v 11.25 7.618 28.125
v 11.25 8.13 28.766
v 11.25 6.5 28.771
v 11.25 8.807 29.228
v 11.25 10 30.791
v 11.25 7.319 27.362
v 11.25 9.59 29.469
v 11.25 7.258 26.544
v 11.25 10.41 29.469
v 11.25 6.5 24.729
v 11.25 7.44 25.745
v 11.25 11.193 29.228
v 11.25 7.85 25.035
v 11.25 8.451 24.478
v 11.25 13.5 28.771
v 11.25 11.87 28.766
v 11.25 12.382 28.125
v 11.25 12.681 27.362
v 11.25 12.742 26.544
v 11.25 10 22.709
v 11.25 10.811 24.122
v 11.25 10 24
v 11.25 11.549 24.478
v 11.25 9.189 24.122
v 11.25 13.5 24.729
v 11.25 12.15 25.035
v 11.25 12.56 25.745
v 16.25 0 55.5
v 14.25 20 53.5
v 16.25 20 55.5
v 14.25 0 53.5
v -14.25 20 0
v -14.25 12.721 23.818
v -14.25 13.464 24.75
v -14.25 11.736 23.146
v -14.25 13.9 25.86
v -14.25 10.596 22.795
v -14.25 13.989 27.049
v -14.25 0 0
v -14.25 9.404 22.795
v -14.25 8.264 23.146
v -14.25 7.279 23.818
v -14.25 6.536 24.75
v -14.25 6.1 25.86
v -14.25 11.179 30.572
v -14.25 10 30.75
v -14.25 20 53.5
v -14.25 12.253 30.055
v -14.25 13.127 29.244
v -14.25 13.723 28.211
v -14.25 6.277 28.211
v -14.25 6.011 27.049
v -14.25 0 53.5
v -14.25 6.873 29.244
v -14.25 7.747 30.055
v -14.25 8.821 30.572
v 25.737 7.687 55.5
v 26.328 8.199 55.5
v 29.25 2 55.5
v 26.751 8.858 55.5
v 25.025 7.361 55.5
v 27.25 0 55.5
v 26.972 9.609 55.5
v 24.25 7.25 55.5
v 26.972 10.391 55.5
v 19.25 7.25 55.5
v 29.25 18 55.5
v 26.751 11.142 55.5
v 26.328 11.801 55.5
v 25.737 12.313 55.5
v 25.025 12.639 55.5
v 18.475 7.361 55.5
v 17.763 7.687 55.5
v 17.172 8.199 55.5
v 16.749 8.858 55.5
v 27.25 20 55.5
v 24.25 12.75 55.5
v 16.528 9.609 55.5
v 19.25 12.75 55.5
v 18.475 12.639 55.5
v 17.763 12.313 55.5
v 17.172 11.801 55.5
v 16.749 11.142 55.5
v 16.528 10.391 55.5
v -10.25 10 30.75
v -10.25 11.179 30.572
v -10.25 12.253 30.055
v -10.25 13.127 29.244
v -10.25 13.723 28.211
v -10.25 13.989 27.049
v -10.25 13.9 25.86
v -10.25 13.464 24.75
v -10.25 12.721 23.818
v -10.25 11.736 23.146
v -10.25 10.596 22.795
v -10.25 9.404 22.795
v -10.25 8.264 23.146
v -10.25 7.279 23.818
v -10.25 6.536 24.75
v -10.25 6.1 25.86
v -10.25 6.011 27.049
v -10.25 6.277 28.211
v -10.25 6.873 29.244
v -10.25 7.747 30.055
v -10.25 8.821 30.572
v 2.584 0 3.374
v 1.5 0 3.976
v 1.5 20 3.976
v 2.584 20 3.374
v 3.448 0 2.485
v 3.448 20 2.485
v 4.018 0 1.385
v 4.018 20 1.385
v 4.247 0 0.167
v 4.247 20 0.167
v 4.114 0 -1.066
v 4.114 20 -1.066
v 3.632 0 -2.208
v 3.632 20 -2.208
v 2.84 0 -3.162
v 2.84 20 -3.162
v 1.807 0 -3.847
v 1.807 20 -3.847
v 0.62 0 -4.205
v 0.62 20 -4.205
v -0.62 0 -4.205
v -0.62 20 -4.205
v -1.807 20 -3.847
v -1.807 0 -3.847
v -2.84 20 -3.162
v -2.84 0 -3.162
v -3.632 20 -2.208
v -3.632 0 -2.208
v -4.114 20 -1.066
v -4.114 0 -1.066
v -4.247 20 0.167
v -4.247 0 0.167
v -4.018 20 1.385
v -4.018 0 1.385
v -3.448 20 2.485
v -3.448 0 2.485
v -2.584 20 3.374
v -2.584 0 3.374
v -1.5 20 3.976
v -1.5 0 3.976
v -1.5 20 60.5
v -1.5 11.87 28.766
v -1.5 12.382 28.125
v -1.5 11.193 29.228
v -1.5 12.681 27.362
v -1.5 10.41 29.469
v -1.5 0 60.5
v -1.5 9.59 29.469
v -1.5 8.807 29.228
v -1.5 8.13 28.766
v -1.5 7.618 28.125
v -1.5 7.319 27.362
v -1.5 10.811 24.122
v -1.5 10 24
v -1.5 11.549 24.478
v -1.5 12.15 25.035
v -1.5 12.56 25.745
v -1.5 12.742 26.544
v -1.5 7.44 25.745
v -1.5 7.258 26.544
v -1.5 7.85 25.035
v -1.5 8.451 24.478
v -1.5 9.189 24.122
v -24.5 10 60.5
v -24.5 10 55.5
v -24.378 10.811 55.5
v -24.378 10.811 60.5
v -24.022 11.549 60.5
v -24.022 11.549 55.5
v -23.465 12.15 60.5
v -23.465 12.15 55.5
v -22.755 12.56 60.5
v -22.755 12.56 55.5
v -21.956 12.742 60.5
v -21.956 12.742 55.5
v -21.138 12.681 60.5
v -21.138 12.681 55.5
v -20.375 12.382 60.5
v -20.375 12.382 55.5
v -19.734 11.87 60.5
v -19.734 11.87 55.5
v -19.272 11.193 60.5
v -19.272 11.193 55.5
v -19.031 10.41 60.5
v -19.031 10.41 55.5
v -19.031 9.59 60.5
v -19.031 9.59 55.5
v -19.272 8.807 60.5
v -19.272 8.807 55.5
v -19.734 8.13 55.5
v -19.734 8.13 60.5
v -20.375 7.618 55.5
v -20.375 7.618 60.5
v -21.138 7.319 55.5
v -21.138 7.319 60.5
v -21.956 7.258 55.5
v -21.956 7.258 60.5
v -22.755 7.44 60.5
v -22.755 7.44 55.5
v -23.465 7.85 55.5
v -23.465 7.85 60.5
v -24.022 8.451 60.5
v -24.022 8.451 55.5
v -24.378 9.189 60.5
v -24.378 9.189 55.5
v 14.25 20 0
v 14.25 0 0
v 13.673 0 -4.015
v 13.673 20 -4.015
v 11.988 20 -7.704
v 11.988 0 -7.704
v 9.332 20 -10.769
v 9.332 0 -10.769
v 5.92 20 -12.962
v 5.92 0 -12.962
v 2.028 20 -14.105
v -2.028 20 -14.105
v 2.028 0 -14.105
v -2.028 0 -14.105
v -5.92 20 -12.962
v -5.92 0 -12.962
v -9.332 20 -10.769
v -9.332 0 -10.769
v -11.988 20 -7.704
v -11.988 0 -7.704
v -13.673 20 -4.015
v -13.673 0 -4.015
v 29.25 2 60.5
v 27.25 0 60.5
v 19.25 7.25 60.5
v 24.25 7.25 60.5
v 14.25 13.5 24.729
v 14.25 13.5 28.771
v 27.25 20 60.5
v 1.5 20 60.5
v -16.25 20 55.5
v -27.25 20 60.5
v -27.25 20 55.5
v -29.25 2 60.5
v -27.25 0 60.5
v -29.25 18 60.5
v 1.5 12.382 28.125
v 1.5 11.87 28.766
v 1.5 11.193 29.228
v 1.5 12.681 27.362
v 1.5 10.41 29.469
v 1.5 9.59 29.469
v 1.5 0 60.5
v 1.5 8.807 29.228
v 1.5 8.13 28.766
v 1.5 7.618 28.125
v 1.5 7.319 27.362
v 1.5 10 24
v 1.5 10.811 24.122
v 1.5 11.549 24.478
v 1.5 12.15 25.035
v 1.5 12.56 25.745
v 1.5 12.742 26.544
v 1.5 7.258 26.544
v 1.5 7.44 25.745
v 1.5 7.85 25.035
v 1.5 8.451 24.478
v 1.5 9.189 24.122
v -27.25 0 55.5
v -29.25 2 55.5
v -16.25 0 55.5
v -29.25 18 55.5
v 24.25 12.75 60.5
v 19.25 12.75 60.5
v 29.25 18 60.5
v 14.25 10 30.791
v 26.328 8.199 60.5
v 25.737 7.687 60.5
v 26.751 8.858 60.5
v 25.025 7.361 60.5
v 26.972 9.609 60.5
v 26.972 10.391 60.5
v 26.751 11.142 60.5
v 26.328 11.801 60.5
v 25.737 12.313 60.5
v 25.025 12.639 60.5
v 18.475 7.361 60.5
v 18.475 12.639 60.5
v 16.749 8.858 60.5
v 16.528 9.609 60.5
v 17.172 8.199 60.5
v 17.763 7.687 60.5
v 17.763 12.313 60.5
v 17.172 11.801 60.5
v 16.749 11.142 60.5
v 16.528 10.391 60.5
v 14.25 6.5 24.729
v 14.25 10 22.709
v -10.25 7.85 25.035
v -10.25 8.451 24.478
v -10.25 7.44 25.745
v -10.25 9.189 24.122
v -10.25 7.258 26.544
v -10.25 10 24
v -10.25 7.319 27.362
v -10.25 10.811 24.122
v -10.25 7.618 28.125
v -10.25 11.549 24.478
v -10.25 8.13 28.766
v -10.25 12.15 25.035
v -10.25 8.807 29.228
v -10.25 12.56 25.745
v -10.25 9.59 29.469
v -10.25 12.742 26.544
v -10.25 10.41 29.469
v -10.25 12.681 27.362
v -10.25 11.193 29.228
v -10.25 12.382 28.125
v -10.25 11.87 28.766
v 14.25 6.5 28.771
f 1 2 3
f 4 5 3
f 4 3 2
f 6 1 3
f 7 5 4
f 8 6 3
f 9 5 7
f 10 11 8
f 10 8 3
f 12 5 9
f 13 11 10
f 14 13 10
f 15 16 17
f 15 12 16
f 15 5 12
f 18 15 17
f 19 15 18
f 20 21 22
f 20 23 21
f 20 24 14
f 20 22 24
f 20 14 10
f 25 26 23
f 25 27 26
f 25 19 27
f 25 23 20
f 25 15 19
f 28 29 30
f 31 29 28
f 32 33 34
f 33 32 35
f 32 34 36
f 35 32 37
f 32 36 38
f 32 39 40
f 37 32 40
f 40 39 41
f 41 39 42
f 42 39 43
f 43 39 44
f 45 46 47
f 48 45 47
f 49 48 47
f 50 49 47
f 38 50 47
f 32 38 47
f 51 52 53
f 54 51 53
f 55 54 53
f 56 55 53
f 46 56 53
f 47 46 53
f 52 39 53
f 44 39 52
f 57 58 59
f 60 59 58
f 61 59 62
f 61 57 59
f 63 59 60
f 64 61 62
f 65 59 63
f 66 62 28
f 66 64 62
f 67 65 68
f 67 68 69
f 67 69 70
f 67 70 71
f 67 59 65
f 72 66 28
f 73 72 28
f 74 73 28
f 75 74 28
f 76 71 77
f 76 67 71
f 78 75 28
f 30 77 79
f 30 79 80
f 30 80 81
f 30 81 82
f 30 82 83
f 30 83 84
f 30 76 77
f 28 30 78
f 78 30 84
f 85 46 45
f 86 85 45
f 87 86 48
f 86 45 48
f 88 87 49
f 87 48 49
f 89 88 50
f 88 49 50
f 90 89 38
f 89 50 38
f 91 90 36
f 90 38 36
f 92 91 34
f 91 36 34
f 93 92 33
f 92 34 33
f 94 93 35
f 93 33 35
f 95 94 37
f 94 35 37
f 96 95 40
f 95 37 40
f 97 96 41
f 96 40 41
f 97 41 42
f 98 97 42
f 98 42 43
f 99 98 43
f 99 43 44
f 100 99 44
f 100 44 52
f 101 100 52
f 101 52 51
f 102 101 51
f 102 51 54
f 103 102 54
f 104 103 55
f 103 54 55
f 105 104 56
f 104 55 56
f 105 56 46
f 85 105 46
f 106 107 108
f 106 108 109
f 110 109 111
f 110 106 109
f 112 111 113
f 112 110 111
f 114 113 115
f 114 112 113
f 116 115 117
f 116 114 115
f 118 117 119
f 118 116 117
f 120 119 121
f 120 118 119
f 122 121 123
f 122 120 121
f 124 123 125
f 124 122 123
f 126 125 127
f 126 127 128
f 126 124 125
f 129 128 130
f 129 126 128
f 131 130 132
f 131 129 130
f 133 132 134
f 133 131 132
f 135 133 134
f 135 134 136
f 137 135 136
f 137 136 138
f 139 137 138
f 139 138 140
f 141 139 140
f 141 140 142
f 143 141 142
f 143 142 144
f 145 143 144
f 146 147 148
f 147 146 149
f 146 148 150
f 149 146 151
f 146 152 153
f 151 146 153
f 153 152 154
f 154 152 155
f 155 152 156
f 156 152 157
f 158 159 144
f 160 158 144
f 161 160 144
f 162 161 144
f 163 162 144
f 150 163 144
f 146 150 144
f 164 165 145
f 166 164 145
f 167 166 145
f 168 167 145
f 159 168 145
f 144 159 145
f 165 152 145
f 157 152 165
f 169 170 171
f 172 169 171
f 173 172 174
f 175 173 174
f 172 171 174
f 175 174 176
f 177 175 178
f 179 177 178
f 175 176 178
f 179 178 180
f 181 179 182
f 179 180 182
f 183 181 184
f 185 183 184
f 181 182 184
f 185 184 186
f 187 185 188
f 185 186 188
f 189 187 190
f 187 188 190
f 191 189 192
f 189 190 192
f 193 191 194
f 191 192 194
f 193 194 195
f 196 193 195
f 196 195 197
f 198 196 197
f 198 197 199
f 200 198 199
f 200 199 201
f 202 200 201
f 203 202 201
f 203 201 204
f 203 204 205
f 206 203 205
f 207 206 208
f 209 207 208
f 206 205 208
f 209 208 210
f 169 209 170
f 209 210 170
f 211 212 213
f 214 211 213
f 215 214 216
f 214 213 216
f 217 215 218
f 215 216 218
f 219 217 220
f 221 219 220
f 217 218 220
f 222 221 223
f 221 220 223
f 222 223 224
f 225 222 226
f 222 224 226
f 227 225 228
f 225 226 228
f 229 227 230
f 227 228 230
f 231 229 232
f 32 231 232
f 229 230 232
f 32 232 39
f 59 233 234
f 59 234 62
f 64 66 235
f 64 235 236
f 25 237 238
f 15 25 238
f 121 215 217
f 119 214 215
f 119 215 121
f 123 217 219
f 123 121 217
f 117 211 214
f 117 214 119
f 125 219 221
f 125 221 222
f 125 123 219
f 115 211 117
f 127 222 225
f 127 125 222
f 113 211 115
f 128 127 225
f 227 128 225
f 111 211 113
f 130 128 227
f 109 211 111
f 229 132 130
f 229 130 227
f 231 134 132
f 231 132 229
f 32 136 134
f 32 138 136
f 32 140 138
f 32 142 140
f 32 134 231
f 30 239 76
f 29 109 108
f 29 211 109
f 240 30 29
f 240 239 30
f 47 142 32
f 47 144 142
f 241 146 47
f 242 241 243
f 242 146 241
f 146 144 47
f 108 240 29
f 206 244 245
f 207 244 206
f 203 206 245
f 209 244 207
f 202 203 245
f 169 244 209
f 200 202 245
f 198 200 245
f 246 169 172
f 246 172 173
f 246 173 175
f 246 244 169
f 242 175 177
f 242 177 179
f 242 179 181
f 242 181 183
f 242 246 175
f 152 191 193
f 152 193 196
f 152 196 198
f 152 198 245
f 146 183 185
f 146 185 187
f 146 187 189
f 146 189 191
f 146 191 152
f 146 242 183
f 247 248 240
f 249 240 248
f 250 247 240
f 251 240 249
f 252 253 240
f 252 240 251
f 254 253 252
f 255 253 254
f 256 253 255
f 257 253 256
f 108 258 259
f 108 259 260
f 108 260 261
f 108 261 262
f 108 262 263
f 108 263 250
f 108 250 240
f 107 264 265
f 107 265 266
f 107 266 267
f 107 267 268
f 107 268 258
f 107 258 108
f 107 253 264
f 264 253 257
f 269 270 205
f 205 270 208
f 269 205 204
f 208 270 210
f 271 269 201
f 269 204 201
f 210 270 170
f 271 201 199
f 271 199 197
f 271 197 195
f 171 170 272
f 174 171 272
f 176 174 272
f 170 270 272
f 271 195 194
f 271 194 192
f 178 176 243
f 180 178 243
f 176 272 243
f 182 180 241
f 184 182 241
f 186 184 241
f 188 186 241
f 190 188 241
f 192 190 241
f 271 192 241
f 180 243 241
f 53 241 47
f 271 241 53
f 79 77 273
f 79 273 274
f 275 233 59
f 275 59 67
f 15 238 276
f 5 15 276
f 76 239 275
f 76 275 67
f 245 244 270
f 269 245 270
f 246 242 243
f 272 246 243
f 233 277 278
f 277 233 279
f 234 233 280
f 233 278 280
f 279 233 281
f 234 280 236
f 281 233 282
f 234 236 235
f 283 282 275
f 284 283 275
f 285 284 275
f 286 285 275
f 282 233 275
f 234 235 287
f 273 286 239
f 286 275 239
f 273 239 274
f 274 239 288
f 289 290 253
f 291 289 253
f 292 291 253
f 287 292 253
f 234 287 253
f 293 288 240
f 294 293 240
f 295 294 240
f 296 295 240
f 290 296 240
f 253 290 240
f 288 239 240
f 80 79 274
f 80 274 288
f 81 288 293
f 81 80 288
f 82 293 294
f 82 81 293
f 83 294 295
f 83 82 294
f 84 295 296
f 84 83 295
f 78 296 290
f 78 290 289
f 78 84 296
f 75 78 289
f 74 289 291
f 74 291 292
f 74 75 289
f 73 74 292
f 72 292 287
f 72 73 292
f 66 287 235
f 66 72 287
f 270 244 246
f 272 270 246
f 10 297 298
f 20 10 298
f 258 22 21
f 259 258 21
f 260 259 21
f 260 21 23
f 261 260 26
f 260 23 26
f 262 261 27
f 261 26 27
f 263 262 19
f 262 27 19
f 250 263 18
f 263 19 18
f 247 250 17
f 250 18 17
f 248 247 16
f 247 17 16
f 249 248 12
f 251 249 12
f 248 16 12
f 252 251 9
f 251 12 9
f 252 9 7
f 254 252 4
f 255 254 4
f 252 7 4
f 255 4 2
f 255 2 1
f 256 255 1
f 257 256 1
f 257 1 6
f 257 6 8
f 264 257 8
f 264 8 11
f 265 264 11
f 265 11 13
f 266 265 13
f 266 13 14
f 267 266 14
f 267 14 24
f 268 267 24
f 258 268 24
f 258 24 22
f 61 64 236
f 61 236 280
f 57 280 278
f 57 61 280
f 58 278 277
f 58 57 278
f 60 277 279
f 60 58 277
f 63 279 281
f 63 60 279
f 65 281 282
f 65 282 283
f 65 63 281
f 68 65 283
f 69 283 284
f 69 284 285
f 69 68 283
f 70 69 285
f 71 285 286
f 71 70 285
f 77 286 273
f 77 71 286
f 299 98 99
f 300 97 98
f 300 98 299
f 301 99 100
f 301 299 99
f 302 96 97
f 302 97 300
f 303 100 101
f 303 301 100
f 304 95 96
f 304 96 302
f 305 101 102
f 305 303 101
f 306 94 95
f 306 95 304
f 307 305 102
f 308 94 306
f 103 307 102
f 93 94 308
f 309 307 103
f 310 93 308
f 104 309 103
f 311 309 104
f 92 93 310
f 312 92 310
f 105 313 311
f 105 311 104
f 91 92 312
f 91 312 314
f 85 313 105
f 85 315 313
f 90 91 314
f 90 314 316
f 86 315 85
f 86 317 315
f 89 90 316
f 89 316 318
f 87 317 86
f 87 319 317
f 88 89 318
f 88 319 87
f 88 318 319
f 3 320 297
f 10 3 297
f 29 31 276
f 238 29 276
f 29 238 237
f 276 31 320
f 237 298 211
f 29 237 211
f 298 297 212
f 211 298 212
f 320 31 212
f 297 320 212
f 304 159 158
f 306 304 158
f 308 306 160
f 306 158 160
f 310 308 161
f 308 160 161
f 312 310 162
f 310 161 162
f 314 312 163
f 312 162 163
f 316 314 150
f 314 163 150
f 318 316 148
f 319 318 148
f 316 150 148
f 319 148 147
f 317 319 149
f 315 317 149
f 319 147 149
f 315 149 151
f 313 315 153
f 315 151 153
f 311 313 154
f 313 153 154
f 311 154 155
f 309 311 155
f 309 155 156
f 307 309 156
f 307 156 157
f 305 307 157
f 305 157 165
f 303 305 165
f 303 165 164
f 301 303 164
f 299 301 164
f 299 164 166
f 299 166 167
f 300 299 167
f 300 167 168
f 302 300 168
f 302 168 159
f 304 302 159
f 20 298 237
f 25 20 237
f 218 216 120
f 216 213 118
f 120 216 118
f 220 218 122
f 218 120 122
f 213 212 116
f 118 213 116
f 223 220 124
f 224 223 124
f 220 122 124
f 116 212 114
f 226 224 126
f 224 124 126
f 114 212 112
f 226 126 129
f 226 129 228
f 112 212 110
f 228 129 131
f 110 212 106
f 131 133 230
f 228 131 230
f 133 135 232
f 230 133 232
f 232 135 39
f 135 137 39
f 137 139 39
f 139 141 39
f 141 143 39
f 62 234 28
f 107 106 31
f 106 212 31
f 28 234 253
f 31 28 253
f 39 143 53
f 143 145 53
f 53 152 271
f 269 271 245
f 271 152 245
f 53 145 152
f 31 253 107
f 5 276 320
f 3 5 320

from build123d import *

# Parameters (mm, degrees)
SKETCH1_R                    = 4.25
BOSS_EXTRUDE1_DEPTH          = 20
CUT_EXTRUDE_THIN1_DEPTH      = 66.294046436
CUT_EXTRUDE_THIN1_DEPTH_BACK = 20
SKETCH3_W                    = 3
SKETCH3_H                    = 60.5
SKETCH4_W                    = 27.75
SKETCH4_H                    = 20
BOSS_EXTRUDE2_DEPTH          = 5
SKETCH5_R                    = 2.75
CUT_EXTRUDE1_DEPTH           = 5
CHAMFER1_SIZE                = 2
CHAMFER2_SIZE                = 2
SKETCH6_R                    = 2.75
CUT_EXTRUDE2_DEPTH           = 35
CUT_EXTRUDE3_DEPTH           = 3
SKETCH8_R                    = 4
CUT_EXTRUDE4_DEPTH           = 4


with BuildPart() as part:
    # Sketch1 → Boss-Extrude1 (new body)
    with BuildSketch(Plane(origin=(0, 0, 0), x_dir=(1, 0, 0), z_dir=(0, 1, 0))):
        with BuildLine():
            Line((-14.25, 0), (-14.25, -60.5))
            Line((-14.25, -60.5), (14.25, -60.5))
            Line((14.25, -60.5), (14.25, 0))
            ThreePointArc((14.25, 0), (0, 14.25), (-14.25, 0))
        make_face()
        with Locations(Location((0, 0, 0), (0, 0, 270))):
            Circle(SKETCH1_R, mode=Mode.SUBTRACT)
    extrude(amount=BOSS_EXTRUDE1_DEPTH)

    # Sketch3 → Cut-Extrude-Thin1 (cut, two sides: drawn at the far end of the back side and taken through both)
    with BuildSketch(Plane(origin=(0, 20, 0), x_dir=(1, 0, 0), z_dir=(0, 1, 0)).offset(-CUT_EXTRUDE_THIN1_DEPTH_BACK)):
        with Locations((0, -30.25)):
            Rectangle(SKETCH3_W, SKETCH3_H)
    extrude(amount=CUT_EXTRUDE_THIN1_DEPTH + CUT_EXTRUDE_THIN1_DEPTH_BACK, mode=Mode.SUBTRACT)

    # Sketch4 → Boss-Extrude2 (add)
    with BuildSketch(Plane.XY.offset(60.5)):
        with Locations((-15.375, 10)):
            Rectangle(SKETCH4_W, SKETCH4_H)
    boss_extrude2 = extrude(amount=-BOSS_EXTRUDE2_DEPTH)

    # Mirror1: Boss-Extrude2 across plane
    add(boss_extrude2.mirror(Plane(origin=(0, 0, 0), x_dir=(0, 0, 1), z_dir=(1, 0, 0))))

    # Sketch5 → Cut-Extrude1 (cut)
    with BuildSketch(Plane(origin=(0, 0, 55.5), x_dir=(-1, 0, 0), z_dir=(0, 0, -1))):
        with Locations((21.75, 10)):
            Circle(SKETCH5_R)
        with BuildLine():
            Line((-24.25, 12.75), (-19.25, 12.75))
            ThreePointArc((-19.25, 12.75), (-16.5, 10), (-19.25, 7.25))
            Line((-19.25, 7.25), (-24.25, 7.25))
            ThreePointArc((-24.25, 7.25), (-27, 10), (-24.25, 12.75))
        make_face()
    extrude(amount=-CUT_EXTRUDE1_DEPTH, mode=Mode.SUBTRACT)

    # Chamfer1
    chamfer1_edges = [part.edges().sort_by_distance(p)[0] for p in [
        (-14.25, 10, 55.5),
        (14.25, 10, 55.5),
    ]]
    chamfer(chamfer1_edges, length=CHAMFER1_SIZE)

    # Chamfer2
    chamfer2_edges = [part.edges().sort_by_distance(p)[0] for p in [
        (-29.25, 20, 58),
        (-29.25, 0, 58),
        (29.25, 0, 58),
        (29.25, 20, 58),
    ]]
    chamfer(chamfer2_edges, length=CHAMFER2_SIZE)

    # Sketch6 → Cut-Extrude2 (cut)
    with BuildSketch(Plane(origin=(14.25, 0, 0), x_dir=(0, 0, -1), z_dir=(1, 0, 0))):
        with Locations((-26.75, 10)):
            Circle(SKETCH6_R)
    extrude(amount=-CUT_EXTRUDE2_DEPTH, mode=Mode.SUBTRACT)

    # Sketch7 → Cut-Extrude3 (cut)
    with BuildSketch(Plane(origin=(14.25, 0, 0), x_dir=(0, 0, -1), z_dir=(1, 0, 0))):
        Polygon((-22.708548116, 10), (-24.729274058, 13.5), (-28.770725942, 13.5), (-30.791451884, 10), (-28.770725942, 6.5), (-24.729274058, 6.5), align=None)
    extrude(amount=-CUT_EXTRUDE3_DEPTH, mode=Mode.SUBTRACT)

    # Sketch8 → Cut-Extrude4 (cut)
    with BuildSketch(Plane.ZY.offset(14.25)):
        with Locations((26.75, 10)):
            Circle(SKETCH8_R)
    extrude(amount=-CUT_EXTRUDE4_DEPTH, mode=Mode.SUBTRACT)


solid = part.part
